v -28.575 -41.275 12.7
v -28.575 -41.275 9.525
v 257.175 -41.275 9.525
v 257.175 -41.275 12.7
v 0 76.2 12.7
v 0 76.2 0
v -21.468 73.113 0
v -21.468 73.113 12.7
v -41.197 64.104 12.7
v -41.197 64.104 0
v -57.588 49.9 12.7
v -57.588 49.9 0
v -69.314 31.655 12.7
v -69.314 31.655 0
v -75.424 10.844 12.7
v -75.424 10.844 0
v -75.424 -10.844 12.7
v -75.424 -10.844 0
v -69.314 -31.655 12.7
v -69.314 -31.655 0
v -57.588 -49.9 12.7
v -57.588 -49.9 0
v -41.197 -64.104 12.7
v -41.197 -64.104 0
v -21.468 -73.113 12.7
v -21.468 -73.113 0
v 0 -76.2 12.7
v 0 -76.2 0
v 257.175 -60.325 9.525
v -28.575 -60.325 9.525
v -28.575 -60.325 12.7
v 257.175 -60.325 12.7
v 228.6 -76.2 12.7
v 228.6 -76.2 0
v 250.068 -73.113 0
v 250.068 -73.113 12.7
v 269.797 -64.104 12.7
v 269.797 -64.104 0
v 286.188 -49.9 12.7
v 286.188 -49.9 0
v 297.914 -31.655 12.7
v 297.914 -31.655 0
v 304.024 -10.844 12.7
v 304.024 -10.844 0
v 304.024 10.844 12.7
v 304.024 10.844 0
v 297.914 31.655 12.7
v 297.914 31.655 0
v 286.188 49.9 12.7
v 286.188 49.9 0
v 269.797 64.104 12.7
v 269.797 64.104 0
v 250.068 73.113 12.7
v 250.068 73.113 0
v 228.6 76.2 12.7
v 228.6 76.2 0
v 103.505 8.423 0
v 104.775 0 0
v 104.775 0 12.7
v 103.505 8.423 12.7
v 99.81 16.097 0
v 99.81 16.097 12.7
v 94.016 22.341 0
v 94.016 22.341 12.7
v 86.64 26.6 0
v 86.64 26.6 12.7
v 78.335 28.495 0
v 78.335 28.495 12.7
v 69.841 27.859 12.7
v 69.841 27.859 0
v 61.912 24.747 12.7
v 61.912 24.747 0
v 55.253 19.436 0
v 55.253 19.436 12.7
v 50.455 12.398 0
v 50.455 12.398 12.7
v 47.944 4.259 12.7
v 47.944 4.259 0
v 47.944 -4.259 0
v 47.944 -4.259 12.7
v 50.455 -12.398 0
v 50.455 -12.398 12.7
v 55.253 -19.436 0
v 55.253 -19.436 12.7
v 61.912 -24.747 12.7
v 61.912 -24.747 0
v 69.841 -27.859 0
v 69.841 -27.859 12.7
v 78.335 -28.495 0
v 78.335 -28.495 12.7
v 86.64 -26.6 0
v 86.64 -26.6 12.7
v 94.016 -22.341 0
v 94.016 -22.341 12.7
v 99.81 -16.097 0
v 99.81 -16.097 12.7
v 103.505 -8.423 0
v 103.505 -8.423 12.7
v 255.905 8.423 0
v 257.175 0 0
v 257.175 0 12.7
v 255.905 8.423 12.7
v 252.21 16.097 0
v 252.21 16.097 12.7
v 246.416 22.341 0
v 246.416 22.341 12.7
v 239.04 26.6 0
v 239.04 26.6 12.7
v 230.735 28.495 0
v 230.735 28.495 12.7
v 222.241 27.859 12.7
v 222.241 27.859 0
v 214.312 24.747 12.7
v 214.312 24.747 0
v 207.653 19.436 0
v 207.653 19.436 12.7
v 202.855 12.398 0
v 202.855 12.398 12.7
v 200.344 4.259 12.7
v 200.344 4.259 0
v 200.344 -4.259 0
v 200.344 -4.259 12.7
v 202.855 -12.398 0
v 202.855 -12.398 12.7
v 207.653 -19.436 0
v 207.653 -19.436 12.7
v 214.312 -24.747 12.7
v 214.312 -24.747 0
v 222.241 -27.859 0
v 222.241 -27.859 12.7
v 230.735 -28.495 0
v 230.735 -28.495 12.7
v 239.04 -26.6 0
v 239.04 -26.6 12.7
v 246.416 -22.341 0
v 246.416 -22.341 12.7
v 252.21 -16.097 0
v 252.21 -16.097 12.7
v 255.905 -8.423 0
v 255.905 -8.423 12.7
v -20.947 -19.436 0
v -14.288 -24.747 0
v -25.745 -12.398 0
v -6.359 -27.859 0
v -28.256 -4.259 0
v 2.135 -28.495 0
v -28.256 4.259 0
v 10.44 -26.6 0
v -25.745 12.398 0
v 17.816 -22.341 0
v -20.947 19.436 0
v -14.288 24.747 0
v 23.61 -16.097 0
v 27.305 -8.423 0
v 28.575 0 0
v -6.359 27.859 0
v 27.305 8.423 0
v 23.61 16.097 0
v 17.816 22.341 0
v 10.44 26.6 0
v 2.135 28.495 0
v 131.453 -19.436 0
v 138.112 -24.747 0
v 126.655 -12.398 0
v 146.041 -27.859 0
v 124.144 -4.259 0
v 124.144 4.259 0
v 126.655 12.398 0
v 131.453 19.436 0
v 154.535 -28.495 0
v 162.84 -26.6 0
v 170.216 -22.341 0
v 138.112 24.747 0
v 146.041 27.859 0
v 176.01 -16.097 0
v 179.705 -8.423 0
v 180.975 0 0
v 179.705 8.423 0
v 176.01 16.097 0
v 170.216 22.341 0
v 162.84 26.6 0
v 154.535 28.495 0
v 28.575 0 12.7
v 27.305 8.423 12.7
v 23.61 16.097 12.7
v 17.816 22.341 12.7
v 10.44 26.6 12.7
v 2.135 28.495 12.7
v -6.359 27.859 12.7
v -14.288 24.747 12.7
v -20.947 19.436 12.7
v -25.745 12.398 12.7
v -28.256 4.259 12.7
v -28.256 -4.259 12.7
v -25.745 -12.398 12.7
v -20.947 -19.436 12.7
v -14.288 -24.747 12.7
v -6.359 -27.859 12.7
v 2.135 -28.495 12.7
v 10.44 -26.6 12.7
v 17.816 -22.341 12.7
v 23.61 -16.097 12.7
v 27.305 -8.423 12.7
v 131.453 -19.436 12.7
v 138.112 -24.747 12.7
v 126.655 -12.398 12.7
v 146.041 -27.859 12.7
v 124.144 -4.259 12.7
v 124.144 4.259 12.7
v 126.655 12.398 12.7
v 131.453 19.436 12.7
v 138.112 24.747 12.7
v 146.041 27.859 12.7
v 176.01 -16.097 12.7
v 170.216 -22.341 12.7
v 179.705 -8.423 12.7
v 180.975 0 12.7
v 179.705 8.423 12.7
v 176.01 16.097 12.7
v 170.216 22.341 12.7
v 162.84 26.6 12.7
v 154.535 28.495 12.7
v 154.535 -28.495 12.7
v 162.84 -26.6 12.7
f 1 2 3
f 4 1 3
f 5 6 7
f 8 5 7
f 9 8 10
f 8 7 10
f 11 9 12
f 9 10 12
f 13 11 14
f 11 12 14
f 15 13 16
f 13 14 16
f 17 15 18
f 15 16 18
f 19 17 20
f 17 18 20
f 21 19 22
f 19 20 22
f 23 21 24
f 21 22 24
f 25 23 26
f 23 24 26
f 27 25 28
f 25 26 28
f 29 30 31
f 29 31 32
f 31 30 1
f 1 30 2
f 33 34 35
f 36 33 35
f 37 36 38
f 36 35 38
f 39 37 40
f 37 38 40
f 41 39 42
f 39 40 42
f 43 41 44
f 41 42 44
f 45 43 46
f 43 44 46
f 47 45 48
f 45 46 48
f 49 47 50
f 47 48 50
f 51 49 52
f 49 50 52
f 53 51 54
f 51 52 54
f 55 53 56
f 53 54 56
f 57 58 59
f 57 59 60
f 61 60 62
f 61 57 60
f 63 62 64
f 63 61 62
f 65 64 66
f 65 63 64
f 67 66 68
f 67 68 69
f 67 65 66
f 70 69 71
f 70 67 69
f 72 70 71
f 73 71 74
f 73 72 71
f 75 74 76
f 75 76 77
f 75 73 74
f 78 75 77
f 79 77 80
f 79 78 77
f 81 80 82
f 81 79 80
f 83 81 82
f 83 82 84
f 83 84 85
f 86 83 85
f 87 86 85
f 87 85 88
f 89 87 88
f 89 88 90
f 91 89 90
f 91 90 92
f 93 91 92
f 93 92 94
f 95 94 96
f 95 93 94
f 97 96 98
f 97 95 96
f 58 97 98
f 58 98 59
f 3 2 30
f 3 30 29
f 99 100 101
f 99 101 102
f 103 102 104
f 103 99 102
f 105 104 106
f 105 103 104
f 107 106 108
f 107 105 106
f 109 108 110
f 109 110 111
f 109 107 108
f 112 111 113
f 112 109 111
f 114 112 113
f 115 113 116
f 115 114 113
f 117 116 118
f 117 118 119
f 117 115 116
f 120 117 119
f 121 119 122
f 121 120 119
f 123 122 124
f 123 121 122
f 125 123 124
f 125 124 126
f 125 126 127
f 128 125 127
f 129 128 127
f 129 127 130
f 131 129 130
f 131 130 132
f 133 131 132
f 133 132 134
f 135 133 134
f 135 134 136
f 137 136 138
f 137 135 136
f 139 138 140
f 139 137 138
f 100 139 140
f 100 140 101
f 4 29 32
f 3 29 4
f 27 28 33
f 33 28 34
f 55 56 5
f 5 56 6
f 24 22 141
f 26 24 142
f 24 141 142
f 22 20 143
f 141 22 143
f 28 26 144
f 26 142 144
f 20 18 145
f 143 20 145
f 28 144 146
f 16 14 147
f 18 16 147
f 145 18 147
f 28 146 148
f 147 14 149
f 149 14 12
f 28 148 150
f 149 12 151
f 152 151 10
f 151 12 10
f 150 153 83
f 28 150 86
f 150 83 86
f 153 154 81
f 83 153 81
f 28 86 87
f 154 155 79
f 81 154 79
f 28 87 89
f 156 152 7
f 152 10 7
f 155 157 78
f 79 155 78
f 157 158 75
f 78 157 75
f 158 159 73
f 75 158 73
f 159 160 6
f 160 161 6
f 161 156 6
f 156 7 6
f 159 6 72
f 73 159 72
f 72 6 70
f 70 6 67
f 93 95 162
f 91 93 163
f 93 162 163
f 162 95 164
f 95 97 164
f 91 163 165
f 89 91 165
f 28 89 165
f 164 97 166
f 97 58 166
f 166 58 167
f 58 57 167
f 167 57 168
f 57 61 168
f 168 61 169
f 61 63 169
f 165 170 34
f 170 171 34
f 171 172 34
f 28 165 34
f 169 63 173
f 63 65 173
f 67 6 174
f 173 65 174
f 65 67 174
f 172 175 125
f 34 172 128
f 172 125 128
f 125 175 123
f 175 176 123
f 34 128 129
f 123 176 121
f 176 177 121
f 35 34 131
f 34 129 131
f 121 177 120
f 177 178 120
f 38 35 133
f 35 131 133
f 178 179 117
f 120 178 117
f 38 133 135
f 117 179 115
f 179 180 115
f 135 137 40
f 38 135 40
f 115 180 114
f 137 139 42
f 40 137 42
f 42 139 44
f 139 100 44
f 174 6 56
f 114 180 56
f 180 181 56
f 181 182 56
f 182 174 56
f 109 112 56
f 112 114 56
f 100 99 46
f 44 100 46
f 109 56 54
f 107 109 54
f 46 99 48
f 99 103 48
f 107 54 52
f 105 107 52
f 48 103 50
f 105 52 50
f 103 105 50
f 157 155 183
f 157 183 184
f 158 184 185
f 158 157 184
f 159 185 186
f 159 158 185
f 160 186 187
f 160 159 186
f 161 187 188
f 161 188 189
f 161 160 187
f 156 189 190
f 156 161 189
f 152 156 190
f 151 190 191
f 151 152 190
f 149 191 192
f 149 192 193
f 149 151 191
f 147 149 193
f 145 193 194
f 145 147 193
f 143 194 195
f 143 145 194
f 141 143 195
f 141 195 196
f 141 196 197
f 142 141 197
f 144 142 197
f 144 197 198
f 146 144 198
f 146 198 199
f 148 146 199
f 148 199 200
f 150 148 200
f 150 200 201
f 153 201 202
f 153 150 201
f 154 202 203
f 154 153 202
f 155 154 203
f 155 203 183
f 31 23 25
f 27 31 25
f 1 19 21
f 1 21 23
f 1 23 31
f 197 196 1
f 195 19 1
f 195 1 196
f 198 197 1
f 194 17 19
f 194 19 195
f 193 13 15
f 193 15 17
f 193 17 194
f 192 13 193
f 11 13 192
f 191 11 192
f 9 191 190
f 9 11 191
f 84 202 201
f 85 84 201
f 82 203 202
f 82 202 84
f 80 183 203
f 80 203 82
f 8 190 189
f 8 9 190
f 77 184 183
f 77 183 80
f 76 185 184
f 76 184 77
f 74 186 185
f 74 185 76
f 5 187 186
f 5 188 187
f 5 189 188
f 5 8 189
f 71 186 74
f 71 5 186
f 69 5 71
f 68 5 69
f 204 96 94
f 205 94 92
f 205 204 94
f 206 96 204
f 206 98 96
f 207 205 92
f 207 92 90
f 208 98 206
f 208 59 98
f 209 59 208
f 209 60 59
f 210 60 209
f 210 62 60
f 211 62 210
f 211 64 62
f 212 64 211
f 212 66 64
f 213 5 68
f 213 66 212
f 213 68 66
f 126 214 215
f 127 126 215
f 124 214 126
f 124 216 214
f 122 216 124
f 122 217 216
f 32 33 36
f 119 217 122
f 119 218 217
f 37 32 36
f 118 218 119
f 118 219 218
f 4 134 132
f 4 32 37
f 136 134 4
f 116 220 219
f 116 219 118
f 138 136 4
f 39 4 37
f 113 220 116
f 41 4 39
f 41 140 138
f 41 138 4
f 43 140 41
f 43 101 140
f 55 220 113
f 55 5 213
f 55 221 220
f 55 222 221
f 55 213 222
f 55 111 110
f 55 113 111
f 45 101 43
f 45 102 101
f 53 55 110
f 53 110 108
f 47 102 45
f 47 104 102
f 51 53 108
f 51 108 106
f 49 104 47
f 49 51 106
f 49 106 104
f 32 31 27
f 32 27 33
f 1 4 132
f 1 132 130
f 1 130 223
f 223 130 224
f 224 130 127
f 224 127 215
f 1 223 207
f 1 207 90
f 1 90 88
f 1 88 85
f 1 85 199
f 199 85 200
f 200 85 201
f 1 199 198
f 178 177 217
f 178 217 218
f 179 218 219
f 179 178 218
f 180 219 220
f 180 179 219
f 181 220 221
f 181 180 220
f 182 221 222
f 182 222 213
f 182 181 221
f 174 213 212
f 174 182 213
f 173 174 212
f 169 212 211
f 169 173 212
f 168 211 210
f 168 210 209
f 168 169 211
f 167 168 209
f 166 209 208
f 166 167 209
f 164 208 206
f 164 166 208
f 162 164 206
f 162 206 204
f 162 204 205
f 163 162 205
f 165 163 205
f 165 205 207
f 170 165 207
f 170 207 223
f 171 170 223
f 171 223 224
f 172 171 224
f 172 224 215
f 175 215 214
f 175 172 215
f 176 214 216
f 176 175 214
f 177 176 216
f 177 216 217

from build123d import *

# Parameters (mm, degrees)
F0_W     = 285.75
F0_H     = 19.05
F1_DEPTH = 9.525
F0_R     = 28.575
F2_DEPTH = 12.7


with BuildPart() as f1:
    # F0 (on Top) → F1 (new body)
    with BuildSketch(Plane.XY):
        with Locations((114.3, -50.8)):
            Rectangle(F0_W, F0_H)
    extrude(amount=F1_DEPTH)

    # F0 (on Top) → F2 (join)
    with BuildSketch(Plane.XY):
        with BuildLine():
            Line((228.6, 76.2), (0, 76.2))
            ThreePointArc((0, 76.2), (-76.2, 0), (0, -76.2))
            Line((0, -76.2), (228.6, -76.2))
            ThreePointArc((228.6, -76.2), (304.8, 0), (228.6, 76.2))
        make_face()
        with Locations((114.3, -50.8)):
            Rectangle(F0_W, F0_H, mode=Mode.SUBTRACT)
        Circle(F0_R, mode=Mode.SUBTRACT)
        with Locations((76.2, 0)):
            Circle(F0_R, mode=Mode.SUBTRACT)
        with Locations((152.4, 0)):
            Circle(F0_R, mode=Mode.SUBTRACT)
        with Locations((228.6, 0)):
            Circle(F0_R, mode=Mode.SUBTRACT)
    extrude(amount=F2_DEPTH)


solid = f1.part
